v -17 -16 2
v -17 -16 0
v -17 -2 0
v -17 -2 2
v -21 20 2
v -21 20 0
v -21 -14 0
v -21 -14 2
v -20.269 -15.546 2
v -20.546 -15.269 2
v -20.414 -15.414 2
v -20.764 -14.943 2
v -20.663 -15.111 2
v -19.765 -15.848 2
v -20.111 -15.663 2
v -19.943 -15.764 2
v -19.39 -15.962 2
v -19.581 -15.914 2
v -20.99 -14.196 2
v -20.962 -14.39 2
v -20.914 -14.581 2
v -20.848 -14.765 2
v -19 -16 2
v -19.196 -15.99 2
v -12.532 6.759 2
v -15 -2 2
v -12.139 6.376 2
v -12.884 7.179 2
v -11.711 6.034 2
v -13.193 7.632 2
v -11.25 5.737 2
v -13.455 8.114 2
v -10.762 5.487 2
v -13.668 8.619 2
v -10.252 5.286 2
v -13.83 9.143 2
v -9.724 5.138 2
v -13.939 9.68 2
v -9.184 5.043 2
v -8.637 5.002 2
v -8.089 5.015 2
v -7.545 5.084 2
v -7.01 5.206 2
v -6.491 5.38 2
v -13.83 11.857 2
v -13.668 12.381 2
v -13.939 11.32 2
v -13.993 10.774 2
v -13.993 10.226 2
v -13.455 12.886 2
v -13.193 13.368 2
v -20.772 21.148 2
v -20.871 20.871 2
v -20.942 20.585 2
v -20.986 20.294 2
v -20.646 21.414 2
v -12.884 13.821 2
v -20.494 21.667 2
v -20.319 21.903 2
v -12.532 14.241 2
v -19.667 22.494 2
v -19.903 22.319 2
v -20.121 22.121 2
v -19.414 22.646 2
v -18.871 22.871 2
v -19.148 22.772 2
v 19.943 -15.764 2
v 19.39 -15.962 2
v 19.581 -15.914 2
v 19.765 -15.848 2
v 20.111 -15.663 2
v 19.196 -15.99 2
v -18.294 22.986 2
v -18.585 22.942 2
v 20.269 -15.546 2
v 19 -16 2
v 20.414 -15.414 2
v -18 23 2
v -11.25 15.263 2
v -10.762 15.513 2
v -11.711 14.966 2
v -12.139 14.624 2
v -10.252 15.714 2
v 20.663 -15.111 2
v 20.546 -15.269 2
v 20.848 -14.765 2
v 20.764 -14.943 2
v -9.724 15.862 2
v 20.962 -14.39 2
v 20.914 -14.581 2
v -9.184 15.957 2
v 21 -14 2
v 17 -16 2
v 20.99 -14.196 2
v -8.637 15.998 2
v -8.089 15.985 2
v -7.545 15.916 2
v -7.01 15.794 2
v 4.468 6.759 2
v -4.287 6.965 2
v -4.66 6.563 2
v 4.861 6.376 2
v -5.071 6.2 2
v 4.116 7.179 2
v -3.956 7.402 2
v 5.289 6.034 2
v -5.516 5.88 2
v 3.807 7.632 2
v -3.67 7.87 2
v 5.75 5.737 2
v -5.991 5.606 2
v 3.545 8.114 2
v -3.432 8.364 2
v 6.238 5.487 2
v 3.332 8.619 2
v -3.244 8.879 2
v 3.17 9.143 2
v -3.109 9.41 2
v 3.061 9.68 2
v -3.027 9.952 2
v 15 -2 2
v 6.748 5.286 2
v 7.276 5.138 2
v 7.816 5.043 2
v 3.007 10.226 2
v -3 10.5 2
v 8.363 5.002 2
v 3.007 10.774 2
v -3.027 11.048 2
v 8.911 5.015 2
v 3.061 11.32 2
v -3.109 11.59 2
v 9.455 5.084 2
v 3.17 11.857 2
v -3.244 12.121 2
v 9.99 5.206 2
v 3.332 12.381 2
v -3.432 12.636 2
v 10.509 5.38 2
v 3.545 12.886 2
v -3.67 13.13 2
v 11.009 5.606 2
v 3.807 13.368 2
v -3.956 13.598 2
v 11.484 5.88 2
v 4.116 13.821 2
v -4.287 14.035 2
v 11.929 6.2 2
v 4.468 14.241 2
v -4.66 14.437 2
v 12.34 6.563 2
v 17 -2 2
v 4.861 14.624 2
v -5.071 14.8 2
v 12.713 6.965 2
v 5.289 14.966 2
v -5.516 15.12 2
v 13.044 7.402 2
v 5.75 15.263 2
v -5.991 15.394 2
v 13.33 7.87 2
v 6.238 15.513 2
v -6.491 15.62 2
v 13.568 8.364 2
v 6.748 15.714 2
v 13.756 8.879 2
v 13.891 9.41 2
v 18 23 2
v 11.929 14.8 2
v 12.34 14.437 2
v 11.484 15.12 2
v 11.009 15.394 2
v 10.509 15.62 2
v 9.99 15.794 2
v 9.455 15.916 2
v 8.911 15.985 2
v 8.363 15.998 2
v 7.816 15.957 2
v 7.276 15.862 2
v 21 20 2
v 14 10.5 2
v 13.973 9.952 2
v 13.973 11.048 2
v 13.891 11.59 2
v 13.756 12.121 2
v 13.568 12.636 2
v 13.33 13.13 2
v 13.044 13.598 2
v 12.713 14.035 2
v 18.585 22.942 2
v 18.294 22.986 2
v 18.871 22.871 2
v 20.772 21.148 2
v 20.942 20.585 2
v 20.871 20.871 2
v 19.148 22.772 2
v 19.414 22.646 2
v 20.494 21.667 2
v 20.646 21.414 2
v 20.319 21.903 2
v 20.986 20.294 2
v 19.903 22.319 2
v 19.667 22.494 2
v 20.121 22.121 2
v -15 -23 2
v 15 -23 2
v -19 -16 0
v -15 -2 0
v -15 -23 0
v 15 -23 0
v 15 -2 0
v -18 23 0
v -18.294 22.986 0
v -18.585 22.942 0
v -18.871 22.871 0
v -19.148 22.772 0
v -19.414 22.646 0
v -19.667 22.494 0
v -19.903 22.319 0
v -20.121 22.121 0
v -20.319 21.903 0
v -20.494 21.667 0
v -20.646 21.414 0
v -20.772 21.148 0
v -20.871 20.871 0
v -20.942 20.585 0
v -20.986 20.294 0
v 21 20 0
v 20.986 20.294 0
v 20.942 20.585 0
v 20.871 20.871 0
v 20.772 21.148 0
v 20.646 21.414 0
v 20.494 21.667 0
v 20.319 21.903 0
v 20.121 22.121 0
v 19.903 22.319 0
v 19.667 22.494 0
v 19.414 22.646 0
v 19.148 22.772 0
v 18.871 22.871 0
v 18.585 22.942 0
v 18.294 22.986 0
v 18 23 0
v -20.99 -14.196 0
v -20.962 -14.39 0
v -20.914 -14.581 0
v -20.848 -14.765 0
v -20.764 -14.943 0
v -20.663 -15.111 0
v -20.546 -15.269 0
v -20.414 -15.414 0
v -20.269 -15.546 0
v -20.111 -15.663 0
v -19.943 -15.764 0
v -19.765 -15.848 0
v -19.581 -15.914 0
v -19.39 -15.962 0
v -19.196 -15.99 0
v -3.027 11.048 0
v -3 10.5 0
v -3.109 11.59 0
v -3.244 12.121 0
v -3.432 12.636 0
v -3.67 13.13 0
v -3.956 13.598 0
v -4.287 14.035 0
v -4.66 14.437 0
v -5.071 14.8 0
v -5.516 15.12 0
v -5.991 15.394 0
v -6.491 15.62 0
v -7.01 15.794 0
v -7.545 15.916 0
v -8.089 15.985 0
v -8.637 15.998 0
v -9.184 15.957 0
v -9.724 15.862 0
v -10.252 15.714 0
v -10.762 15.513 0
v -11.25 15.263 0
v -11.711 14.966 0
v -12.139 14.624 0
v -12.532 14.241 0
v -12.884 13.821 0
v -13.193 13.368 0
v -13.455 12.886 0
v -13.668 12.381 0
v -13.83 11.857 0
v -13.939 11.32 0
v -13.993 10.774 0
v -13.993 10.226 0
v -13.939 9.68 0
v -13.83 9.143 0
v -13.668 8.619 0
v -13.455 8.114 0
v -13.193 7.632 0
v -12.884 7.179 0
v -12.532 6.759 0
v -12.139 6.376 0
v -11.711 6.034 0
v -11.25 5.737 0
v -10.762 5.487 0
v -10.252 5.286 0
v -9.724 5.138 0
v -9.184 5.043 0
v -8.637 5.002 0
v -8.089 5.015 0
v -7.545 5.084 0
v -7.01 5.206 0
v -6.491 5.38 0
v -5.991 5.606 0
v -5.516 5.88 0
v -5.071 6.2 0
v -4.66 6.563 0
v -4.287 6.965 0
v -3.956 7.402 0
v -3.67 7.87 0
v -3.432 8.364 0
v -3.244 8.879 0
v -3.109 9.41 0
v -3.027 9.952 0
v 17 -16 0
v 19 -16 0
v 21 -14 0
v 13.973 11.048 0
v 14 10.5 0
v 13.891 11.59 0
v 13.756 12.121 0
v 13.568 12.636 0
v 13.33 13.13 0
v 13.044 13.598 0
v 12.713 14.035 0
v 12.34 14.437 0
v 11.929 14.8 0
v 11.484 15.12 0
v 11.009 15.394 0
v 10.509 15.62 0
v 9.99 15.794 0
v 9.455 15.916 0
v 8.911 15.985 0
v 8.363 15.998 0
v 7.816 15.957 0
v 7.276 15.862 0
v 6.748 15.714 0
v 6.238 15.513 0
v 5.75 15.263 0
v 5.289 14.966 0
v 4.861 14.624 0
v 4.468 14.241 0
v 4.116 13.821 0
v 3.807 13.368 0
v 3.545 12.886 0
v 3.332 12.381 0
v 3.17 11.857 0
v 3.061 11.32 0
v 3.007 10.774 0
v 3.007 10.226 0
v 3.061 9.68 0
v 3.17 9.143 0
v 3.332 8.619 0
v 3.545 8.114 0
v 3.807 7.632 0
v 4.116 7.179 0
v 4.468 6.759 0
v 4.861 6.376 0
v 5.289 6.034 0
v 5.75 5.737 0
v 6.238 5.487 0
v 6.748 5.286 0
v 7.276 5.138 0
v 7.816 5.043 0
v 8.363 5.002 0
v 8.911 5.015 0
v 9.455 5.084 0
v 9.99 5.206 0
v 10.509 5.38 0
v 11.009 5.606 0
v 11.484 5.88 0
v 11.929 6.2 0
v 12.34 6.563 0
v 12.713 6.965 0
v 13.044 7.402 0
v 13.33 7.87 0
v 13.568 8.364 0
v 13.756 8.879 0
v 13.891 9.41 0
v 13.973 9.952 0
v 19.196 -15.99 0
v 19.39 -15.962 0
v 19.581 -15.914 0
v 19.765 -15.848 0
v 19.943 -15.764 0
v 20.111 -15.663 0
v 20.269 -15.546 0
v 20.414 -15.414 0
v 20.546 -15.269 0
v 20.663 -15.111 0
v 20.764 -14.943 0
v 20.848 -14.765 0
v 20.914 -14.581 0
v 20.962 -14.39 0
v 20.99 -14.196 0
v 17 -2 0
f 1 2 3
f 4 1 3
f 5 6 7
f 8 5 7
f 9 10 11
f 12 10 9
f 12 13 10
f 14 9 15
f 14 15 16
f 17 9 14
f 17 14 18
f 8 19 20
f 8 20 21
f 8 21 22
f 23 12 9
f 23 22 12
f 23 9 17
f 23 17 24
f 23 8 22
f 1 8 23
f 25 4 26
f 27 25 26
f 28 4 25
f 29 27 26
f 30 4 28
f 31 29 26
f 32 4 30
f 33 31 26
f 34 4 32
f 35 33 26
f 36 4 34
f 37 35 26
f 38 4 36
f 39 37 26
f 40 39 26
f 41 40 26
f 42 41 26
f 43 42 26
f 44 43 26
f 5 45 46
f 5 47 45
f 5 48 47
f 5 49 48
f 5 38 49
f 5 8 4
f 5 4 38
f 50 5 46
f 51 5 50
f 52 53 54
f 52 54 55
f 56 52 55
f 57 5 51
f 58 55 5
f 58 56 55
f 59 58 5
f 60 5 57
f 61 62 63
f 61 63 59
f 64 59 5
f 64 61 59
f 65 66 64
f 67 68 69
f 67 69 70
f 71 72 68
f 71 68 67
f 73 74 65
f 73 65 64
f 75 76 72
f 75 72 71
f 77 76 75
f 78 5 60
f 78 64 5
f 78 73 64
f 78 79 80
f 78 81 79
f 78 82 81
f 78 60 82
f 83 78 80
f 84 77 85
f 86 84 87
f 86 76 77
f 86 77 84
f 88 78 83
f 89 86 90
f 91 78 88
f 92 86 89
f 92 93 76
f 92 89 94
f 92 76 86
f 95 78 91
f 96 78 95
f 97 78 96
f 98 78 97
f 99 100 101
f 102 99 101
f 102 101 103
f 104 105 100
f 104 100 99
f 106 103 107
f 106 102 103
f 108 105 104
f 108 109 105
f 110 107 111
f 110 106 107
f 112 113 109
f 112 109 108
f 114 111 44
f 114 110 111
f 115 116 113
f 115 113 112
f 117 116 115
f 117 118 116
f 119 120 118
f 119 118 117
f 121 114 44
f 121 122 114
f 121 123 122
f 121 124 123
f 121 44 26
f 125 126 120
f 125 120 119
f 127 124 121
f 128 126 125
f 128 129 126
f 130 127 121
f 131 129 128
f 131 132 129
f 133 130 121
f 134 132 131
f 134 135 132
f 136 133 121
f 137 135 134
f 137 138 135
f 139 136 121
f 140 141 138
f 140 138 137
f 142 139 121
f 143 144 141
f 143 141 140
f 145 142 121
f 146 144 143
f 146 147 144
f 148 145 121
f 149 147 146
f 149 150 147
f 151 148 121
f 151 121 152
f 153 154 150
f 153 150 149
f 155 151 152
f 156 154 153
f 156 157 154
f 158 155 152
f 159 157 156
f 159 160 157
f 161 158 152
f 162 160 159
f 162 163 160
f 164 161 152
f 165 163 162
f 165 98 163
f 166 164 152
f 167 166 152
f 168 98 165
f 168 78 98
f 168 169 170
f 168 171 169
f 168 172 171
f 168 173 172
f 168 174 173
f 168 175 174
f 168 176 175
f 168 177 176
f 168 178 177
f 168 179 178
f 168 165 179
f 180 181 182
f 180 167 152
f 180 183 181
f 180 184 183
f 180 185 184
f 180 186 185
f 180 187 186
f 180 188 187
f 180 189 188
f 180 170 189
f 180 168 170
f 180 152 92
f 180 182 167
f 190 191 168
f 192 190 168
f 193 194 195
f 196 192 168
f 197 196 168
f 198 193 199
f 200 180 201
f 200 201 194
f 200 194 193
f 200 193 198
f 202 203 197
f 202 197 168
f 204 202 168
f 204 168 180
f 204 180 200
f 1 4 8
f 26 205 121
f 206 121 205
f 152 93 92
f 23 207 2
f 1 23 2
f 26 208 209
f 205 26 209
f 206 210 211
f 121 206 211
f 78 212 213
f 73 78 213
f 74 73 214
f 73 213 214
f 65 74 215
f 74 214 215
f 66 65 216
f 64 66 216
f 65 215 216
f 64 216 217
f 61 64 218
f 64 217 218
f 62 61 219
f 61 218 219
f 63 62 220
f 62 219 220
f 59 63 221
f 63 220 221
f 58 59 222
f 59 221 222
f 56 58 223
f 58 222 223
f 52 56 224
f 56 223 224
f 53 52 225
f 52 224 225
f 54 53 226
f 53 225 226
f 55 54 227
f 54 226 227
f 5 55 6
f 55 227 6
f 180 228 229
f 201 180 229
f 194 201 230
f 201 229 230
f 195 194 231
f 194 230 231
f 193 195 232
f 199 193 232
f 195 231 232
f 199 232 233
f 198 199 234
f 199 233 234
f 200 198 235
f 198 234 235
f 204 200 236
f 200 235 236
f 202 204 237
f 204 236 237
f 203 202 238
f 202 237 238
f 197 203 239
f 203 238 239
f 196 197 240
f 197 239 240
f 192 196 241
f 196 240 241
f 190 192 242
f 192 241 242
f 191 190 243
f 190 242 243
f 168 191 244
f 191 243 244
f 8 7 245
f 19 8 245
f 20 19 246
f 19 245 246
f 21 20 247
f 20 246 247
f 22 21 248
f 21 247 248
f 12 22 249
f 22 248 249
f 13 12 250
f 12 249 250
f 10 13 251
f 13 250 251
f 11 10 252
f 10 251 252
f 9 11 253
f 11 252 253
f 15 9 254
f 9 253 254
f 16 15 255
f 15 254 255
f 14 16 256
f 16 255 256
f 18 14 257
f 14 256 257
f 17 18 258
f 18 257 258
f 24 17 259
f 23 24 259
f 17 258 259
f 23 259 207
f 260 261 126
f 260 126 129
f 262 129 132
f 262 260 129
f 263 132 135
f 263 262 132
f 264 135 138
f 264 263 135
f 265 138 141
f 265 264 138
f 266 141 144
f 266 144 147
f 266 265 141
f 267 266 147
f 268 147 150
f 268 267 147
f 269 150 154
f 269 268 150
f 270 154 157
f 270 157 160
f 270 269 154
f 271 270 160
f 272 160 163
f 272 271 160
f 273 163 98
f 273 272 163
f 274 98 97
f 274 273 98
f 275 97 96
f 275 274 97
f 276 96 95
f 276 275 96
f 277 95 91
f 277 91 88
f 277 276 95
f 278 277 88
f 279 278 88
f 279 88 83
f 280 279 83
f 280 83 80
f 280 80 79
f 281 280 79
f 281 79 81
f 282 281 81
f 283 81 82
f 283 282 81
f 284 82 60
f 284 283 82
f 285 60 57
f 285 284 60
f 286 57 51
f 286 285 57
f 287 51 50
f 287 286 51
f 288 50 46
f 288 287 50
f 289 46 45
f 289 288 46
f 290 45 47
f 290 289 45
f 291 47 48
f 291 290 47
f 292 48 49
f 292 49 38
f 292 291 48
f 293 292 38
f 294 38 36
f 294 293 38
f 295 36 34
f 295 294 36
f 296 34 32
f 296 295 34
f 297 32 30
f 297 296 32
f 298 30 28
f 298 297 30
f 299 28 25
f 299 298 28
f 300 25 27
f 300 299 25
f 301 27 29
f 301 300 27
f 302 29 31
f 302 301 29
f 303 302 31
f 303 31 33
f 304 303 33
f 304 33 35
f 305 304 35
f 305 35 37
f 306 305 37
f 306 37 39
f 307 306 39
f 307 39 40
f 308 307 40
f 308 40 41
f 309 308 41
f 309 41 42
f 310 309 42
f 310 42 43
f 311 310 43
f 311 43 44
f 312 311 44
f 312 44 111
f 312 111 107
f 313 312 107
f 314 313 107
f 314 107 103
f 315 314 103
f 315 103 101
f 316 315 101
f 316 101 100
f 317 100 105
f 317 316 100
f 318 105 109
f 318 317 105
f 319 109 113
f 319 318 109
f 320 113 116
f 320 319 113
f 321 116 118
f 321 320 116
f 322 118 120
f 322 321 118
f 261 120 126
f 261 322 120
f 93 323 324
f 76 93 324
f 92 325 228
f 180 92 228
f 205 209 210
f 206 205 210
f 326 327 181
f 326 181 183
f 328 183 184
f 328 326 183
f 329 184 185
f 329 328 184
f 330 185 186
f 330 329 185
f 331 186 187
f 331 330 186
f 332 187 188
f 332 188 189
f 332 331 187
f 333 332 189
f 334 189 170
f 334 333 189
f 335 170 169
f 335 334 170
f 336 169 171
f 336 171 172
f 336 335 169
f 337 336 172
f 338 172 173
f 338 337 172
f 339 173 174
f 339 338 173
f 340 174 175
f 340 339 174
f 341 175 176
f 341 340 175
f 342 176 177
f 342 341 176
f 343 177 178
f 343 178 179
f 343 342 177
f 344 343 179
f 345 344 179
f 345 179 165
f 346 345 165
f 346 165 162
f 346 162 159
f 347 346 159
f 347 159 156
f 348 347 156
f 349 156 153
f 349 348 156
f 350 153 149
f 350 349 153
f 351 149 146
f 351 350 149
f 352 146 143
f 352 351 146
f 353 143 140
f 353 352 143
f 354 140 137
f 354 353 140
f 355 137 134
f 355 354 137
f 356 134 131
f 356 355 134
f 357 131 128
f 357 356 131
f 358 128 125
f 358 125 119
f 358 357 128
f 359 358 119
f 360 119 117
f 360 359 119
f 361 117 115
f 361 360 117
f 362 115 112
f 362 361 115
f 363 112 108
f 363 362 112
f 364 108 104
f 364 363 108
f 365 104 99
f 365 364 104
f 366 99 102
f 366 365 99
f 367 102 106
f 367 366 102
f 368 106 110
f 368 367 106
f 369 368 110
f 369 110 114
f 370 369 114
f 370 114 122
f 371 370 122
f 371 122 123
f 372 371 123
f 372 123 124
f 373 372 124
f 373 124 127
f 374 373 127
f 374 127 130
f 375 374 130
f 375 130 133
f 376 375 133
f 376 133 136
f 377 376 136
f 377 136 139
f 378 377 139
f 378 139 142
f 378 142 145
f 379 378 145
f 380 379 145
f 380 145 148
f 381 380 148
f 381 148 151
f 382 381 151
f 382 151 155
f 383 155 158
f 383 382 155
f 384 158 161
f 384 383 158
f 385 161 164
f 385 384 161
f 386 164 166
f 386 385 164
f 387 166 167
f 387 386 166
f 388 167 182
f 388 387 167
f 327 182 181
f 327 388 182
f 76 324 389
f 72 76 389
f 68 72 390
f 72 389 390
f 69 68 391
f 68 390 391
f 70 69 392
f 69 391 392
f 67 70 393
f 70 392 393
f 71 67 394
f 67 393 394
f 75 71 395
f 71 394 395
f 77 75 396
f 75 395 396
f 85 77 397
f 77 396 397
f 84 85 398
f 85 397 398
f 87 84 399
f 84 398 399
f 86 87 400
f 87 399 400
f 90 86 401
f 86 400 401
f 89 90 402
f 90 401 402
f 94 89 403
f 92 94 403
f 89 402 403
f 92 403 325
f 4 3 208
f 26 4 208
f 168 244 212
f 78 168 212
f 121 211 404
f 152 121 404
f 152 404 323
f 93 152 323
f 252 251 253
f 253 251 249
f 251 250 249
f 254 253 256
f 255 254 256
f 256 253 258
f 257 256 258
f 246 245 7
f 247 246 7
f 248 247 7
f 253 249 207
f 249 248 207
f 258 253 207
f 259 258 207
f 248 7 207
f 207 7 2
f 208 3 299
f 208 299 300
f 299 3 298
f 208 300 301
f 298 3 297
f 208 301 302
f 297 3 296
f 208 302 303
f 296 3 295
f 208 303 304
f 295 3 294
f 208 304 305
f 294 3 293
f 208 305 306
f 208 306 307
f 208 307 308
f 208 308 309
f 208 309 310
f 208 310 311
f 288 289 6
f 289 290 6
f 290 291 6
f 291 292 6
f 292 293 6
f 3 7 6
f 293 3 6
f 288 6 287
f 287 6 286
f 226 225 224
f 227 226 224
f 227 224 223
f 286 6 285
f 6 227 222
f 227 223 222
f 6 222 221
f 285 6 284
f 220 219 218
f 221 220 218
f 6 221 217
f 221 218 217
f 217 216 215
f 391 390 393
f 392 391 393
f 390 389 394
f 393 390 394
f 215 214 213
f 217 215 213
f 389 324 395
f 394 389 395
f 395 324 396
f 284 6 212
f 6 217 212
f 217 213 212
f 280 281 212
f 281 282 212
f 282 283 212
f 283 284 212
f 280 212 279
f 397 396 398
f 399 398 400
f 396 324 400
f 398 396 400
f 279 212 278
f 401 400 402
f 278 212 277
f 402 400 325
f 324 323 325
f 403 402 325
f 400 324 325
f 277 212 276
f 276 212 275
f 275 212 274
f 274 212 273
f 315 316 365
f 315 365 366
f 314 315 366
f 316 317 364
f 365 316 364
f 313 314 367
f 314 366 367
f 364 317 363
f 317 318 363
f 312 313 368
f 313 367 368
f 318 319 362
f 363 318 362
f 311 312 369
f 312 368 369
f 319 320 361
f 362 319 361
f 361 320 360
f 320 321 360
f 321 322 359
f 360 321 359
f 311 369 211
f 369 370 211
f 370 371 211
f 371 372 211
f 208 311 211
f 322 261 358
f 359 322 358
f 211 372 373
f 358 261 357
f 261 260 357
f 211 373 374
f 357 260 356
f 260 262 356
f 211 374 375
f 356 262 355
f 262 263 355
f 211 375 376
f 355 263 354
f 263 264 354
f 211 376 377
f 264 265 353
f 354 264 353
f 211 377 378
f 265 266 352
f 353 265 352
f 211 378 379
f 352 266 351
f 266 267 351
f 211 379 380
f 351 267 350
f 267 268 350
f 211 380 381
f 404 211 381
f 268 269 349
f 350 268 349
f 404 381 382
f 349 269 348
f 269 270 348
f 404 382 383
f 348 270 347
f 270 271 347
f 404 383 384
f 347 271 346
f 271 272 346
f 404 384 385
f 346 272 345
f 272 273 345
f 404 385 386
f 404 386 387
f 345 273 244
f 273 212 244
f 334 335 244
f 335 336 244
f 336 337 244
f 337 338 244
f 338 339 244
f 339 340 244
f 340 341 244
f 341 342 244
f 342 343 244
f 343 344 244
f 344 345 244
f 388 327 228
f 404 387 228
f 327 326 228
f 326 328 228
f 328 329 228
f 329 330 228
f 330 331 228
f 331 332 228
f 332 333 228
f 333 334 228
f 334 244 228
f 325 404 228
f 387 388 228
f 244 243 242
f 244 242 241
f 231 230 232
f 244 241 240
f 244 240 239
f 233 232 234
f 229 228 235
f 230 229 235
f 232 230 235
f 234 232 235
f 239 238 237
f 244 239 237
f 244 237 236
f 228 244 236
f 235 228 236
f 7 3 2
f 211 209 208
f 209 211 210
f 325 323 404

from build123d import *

# Parameters (mm, degrees)
F0_R     = 5.5
F1_DEPTH = 2


with BuildPart() as f1:
    # F0 (on Top) → F1 (new body)
    with BuildSketch(Plane.XY):
        with BuildLine():
            Line((15, 23), (-15, 23))
            Line((-15, 23), (-18, 23))
            ThreePointArc((-18, 23), (-20.12132, 22.12132), (-21, 20))
            Line((-21, 20), (-21, -14))
            ThreePointArc((-21, -14), (-20.414214, -15.414214), (-19, -16))
            Line((-19, -16), (-17, -16))
            Line((-17, -16), (-17, -2))
            Line((-17, -2), (-15, -2))
            Line((-15, -2), (-15, -23))
            Line((-15, -23), (15, -23))
            Line((15, -23), (15, -2))
            Line((15, -2), (17, -2))
            Line((17, -2), (17, -16))
            Line((17, -16), (19, -16))
            ThreePointArc((19, -16), (20.414214, -15.414214), (21, -14))
            Line((21, -14), (21, 20))
            ThreePointArc((21, 20), (20.12132, 22.12132), (18, 23))
            Line((18, 23), (15, 23))
        make_face()
        with Locations((-8.5, 10.5)):
            Circle(F0_R, mode=Mode.SUBTRACT)
        with Locations((8.5, 10.5)):
            Circle(F0_R, mode=Mode.SUBTRACT)
    extrude(amount=F1_DEPTH)


solid = f1.part
